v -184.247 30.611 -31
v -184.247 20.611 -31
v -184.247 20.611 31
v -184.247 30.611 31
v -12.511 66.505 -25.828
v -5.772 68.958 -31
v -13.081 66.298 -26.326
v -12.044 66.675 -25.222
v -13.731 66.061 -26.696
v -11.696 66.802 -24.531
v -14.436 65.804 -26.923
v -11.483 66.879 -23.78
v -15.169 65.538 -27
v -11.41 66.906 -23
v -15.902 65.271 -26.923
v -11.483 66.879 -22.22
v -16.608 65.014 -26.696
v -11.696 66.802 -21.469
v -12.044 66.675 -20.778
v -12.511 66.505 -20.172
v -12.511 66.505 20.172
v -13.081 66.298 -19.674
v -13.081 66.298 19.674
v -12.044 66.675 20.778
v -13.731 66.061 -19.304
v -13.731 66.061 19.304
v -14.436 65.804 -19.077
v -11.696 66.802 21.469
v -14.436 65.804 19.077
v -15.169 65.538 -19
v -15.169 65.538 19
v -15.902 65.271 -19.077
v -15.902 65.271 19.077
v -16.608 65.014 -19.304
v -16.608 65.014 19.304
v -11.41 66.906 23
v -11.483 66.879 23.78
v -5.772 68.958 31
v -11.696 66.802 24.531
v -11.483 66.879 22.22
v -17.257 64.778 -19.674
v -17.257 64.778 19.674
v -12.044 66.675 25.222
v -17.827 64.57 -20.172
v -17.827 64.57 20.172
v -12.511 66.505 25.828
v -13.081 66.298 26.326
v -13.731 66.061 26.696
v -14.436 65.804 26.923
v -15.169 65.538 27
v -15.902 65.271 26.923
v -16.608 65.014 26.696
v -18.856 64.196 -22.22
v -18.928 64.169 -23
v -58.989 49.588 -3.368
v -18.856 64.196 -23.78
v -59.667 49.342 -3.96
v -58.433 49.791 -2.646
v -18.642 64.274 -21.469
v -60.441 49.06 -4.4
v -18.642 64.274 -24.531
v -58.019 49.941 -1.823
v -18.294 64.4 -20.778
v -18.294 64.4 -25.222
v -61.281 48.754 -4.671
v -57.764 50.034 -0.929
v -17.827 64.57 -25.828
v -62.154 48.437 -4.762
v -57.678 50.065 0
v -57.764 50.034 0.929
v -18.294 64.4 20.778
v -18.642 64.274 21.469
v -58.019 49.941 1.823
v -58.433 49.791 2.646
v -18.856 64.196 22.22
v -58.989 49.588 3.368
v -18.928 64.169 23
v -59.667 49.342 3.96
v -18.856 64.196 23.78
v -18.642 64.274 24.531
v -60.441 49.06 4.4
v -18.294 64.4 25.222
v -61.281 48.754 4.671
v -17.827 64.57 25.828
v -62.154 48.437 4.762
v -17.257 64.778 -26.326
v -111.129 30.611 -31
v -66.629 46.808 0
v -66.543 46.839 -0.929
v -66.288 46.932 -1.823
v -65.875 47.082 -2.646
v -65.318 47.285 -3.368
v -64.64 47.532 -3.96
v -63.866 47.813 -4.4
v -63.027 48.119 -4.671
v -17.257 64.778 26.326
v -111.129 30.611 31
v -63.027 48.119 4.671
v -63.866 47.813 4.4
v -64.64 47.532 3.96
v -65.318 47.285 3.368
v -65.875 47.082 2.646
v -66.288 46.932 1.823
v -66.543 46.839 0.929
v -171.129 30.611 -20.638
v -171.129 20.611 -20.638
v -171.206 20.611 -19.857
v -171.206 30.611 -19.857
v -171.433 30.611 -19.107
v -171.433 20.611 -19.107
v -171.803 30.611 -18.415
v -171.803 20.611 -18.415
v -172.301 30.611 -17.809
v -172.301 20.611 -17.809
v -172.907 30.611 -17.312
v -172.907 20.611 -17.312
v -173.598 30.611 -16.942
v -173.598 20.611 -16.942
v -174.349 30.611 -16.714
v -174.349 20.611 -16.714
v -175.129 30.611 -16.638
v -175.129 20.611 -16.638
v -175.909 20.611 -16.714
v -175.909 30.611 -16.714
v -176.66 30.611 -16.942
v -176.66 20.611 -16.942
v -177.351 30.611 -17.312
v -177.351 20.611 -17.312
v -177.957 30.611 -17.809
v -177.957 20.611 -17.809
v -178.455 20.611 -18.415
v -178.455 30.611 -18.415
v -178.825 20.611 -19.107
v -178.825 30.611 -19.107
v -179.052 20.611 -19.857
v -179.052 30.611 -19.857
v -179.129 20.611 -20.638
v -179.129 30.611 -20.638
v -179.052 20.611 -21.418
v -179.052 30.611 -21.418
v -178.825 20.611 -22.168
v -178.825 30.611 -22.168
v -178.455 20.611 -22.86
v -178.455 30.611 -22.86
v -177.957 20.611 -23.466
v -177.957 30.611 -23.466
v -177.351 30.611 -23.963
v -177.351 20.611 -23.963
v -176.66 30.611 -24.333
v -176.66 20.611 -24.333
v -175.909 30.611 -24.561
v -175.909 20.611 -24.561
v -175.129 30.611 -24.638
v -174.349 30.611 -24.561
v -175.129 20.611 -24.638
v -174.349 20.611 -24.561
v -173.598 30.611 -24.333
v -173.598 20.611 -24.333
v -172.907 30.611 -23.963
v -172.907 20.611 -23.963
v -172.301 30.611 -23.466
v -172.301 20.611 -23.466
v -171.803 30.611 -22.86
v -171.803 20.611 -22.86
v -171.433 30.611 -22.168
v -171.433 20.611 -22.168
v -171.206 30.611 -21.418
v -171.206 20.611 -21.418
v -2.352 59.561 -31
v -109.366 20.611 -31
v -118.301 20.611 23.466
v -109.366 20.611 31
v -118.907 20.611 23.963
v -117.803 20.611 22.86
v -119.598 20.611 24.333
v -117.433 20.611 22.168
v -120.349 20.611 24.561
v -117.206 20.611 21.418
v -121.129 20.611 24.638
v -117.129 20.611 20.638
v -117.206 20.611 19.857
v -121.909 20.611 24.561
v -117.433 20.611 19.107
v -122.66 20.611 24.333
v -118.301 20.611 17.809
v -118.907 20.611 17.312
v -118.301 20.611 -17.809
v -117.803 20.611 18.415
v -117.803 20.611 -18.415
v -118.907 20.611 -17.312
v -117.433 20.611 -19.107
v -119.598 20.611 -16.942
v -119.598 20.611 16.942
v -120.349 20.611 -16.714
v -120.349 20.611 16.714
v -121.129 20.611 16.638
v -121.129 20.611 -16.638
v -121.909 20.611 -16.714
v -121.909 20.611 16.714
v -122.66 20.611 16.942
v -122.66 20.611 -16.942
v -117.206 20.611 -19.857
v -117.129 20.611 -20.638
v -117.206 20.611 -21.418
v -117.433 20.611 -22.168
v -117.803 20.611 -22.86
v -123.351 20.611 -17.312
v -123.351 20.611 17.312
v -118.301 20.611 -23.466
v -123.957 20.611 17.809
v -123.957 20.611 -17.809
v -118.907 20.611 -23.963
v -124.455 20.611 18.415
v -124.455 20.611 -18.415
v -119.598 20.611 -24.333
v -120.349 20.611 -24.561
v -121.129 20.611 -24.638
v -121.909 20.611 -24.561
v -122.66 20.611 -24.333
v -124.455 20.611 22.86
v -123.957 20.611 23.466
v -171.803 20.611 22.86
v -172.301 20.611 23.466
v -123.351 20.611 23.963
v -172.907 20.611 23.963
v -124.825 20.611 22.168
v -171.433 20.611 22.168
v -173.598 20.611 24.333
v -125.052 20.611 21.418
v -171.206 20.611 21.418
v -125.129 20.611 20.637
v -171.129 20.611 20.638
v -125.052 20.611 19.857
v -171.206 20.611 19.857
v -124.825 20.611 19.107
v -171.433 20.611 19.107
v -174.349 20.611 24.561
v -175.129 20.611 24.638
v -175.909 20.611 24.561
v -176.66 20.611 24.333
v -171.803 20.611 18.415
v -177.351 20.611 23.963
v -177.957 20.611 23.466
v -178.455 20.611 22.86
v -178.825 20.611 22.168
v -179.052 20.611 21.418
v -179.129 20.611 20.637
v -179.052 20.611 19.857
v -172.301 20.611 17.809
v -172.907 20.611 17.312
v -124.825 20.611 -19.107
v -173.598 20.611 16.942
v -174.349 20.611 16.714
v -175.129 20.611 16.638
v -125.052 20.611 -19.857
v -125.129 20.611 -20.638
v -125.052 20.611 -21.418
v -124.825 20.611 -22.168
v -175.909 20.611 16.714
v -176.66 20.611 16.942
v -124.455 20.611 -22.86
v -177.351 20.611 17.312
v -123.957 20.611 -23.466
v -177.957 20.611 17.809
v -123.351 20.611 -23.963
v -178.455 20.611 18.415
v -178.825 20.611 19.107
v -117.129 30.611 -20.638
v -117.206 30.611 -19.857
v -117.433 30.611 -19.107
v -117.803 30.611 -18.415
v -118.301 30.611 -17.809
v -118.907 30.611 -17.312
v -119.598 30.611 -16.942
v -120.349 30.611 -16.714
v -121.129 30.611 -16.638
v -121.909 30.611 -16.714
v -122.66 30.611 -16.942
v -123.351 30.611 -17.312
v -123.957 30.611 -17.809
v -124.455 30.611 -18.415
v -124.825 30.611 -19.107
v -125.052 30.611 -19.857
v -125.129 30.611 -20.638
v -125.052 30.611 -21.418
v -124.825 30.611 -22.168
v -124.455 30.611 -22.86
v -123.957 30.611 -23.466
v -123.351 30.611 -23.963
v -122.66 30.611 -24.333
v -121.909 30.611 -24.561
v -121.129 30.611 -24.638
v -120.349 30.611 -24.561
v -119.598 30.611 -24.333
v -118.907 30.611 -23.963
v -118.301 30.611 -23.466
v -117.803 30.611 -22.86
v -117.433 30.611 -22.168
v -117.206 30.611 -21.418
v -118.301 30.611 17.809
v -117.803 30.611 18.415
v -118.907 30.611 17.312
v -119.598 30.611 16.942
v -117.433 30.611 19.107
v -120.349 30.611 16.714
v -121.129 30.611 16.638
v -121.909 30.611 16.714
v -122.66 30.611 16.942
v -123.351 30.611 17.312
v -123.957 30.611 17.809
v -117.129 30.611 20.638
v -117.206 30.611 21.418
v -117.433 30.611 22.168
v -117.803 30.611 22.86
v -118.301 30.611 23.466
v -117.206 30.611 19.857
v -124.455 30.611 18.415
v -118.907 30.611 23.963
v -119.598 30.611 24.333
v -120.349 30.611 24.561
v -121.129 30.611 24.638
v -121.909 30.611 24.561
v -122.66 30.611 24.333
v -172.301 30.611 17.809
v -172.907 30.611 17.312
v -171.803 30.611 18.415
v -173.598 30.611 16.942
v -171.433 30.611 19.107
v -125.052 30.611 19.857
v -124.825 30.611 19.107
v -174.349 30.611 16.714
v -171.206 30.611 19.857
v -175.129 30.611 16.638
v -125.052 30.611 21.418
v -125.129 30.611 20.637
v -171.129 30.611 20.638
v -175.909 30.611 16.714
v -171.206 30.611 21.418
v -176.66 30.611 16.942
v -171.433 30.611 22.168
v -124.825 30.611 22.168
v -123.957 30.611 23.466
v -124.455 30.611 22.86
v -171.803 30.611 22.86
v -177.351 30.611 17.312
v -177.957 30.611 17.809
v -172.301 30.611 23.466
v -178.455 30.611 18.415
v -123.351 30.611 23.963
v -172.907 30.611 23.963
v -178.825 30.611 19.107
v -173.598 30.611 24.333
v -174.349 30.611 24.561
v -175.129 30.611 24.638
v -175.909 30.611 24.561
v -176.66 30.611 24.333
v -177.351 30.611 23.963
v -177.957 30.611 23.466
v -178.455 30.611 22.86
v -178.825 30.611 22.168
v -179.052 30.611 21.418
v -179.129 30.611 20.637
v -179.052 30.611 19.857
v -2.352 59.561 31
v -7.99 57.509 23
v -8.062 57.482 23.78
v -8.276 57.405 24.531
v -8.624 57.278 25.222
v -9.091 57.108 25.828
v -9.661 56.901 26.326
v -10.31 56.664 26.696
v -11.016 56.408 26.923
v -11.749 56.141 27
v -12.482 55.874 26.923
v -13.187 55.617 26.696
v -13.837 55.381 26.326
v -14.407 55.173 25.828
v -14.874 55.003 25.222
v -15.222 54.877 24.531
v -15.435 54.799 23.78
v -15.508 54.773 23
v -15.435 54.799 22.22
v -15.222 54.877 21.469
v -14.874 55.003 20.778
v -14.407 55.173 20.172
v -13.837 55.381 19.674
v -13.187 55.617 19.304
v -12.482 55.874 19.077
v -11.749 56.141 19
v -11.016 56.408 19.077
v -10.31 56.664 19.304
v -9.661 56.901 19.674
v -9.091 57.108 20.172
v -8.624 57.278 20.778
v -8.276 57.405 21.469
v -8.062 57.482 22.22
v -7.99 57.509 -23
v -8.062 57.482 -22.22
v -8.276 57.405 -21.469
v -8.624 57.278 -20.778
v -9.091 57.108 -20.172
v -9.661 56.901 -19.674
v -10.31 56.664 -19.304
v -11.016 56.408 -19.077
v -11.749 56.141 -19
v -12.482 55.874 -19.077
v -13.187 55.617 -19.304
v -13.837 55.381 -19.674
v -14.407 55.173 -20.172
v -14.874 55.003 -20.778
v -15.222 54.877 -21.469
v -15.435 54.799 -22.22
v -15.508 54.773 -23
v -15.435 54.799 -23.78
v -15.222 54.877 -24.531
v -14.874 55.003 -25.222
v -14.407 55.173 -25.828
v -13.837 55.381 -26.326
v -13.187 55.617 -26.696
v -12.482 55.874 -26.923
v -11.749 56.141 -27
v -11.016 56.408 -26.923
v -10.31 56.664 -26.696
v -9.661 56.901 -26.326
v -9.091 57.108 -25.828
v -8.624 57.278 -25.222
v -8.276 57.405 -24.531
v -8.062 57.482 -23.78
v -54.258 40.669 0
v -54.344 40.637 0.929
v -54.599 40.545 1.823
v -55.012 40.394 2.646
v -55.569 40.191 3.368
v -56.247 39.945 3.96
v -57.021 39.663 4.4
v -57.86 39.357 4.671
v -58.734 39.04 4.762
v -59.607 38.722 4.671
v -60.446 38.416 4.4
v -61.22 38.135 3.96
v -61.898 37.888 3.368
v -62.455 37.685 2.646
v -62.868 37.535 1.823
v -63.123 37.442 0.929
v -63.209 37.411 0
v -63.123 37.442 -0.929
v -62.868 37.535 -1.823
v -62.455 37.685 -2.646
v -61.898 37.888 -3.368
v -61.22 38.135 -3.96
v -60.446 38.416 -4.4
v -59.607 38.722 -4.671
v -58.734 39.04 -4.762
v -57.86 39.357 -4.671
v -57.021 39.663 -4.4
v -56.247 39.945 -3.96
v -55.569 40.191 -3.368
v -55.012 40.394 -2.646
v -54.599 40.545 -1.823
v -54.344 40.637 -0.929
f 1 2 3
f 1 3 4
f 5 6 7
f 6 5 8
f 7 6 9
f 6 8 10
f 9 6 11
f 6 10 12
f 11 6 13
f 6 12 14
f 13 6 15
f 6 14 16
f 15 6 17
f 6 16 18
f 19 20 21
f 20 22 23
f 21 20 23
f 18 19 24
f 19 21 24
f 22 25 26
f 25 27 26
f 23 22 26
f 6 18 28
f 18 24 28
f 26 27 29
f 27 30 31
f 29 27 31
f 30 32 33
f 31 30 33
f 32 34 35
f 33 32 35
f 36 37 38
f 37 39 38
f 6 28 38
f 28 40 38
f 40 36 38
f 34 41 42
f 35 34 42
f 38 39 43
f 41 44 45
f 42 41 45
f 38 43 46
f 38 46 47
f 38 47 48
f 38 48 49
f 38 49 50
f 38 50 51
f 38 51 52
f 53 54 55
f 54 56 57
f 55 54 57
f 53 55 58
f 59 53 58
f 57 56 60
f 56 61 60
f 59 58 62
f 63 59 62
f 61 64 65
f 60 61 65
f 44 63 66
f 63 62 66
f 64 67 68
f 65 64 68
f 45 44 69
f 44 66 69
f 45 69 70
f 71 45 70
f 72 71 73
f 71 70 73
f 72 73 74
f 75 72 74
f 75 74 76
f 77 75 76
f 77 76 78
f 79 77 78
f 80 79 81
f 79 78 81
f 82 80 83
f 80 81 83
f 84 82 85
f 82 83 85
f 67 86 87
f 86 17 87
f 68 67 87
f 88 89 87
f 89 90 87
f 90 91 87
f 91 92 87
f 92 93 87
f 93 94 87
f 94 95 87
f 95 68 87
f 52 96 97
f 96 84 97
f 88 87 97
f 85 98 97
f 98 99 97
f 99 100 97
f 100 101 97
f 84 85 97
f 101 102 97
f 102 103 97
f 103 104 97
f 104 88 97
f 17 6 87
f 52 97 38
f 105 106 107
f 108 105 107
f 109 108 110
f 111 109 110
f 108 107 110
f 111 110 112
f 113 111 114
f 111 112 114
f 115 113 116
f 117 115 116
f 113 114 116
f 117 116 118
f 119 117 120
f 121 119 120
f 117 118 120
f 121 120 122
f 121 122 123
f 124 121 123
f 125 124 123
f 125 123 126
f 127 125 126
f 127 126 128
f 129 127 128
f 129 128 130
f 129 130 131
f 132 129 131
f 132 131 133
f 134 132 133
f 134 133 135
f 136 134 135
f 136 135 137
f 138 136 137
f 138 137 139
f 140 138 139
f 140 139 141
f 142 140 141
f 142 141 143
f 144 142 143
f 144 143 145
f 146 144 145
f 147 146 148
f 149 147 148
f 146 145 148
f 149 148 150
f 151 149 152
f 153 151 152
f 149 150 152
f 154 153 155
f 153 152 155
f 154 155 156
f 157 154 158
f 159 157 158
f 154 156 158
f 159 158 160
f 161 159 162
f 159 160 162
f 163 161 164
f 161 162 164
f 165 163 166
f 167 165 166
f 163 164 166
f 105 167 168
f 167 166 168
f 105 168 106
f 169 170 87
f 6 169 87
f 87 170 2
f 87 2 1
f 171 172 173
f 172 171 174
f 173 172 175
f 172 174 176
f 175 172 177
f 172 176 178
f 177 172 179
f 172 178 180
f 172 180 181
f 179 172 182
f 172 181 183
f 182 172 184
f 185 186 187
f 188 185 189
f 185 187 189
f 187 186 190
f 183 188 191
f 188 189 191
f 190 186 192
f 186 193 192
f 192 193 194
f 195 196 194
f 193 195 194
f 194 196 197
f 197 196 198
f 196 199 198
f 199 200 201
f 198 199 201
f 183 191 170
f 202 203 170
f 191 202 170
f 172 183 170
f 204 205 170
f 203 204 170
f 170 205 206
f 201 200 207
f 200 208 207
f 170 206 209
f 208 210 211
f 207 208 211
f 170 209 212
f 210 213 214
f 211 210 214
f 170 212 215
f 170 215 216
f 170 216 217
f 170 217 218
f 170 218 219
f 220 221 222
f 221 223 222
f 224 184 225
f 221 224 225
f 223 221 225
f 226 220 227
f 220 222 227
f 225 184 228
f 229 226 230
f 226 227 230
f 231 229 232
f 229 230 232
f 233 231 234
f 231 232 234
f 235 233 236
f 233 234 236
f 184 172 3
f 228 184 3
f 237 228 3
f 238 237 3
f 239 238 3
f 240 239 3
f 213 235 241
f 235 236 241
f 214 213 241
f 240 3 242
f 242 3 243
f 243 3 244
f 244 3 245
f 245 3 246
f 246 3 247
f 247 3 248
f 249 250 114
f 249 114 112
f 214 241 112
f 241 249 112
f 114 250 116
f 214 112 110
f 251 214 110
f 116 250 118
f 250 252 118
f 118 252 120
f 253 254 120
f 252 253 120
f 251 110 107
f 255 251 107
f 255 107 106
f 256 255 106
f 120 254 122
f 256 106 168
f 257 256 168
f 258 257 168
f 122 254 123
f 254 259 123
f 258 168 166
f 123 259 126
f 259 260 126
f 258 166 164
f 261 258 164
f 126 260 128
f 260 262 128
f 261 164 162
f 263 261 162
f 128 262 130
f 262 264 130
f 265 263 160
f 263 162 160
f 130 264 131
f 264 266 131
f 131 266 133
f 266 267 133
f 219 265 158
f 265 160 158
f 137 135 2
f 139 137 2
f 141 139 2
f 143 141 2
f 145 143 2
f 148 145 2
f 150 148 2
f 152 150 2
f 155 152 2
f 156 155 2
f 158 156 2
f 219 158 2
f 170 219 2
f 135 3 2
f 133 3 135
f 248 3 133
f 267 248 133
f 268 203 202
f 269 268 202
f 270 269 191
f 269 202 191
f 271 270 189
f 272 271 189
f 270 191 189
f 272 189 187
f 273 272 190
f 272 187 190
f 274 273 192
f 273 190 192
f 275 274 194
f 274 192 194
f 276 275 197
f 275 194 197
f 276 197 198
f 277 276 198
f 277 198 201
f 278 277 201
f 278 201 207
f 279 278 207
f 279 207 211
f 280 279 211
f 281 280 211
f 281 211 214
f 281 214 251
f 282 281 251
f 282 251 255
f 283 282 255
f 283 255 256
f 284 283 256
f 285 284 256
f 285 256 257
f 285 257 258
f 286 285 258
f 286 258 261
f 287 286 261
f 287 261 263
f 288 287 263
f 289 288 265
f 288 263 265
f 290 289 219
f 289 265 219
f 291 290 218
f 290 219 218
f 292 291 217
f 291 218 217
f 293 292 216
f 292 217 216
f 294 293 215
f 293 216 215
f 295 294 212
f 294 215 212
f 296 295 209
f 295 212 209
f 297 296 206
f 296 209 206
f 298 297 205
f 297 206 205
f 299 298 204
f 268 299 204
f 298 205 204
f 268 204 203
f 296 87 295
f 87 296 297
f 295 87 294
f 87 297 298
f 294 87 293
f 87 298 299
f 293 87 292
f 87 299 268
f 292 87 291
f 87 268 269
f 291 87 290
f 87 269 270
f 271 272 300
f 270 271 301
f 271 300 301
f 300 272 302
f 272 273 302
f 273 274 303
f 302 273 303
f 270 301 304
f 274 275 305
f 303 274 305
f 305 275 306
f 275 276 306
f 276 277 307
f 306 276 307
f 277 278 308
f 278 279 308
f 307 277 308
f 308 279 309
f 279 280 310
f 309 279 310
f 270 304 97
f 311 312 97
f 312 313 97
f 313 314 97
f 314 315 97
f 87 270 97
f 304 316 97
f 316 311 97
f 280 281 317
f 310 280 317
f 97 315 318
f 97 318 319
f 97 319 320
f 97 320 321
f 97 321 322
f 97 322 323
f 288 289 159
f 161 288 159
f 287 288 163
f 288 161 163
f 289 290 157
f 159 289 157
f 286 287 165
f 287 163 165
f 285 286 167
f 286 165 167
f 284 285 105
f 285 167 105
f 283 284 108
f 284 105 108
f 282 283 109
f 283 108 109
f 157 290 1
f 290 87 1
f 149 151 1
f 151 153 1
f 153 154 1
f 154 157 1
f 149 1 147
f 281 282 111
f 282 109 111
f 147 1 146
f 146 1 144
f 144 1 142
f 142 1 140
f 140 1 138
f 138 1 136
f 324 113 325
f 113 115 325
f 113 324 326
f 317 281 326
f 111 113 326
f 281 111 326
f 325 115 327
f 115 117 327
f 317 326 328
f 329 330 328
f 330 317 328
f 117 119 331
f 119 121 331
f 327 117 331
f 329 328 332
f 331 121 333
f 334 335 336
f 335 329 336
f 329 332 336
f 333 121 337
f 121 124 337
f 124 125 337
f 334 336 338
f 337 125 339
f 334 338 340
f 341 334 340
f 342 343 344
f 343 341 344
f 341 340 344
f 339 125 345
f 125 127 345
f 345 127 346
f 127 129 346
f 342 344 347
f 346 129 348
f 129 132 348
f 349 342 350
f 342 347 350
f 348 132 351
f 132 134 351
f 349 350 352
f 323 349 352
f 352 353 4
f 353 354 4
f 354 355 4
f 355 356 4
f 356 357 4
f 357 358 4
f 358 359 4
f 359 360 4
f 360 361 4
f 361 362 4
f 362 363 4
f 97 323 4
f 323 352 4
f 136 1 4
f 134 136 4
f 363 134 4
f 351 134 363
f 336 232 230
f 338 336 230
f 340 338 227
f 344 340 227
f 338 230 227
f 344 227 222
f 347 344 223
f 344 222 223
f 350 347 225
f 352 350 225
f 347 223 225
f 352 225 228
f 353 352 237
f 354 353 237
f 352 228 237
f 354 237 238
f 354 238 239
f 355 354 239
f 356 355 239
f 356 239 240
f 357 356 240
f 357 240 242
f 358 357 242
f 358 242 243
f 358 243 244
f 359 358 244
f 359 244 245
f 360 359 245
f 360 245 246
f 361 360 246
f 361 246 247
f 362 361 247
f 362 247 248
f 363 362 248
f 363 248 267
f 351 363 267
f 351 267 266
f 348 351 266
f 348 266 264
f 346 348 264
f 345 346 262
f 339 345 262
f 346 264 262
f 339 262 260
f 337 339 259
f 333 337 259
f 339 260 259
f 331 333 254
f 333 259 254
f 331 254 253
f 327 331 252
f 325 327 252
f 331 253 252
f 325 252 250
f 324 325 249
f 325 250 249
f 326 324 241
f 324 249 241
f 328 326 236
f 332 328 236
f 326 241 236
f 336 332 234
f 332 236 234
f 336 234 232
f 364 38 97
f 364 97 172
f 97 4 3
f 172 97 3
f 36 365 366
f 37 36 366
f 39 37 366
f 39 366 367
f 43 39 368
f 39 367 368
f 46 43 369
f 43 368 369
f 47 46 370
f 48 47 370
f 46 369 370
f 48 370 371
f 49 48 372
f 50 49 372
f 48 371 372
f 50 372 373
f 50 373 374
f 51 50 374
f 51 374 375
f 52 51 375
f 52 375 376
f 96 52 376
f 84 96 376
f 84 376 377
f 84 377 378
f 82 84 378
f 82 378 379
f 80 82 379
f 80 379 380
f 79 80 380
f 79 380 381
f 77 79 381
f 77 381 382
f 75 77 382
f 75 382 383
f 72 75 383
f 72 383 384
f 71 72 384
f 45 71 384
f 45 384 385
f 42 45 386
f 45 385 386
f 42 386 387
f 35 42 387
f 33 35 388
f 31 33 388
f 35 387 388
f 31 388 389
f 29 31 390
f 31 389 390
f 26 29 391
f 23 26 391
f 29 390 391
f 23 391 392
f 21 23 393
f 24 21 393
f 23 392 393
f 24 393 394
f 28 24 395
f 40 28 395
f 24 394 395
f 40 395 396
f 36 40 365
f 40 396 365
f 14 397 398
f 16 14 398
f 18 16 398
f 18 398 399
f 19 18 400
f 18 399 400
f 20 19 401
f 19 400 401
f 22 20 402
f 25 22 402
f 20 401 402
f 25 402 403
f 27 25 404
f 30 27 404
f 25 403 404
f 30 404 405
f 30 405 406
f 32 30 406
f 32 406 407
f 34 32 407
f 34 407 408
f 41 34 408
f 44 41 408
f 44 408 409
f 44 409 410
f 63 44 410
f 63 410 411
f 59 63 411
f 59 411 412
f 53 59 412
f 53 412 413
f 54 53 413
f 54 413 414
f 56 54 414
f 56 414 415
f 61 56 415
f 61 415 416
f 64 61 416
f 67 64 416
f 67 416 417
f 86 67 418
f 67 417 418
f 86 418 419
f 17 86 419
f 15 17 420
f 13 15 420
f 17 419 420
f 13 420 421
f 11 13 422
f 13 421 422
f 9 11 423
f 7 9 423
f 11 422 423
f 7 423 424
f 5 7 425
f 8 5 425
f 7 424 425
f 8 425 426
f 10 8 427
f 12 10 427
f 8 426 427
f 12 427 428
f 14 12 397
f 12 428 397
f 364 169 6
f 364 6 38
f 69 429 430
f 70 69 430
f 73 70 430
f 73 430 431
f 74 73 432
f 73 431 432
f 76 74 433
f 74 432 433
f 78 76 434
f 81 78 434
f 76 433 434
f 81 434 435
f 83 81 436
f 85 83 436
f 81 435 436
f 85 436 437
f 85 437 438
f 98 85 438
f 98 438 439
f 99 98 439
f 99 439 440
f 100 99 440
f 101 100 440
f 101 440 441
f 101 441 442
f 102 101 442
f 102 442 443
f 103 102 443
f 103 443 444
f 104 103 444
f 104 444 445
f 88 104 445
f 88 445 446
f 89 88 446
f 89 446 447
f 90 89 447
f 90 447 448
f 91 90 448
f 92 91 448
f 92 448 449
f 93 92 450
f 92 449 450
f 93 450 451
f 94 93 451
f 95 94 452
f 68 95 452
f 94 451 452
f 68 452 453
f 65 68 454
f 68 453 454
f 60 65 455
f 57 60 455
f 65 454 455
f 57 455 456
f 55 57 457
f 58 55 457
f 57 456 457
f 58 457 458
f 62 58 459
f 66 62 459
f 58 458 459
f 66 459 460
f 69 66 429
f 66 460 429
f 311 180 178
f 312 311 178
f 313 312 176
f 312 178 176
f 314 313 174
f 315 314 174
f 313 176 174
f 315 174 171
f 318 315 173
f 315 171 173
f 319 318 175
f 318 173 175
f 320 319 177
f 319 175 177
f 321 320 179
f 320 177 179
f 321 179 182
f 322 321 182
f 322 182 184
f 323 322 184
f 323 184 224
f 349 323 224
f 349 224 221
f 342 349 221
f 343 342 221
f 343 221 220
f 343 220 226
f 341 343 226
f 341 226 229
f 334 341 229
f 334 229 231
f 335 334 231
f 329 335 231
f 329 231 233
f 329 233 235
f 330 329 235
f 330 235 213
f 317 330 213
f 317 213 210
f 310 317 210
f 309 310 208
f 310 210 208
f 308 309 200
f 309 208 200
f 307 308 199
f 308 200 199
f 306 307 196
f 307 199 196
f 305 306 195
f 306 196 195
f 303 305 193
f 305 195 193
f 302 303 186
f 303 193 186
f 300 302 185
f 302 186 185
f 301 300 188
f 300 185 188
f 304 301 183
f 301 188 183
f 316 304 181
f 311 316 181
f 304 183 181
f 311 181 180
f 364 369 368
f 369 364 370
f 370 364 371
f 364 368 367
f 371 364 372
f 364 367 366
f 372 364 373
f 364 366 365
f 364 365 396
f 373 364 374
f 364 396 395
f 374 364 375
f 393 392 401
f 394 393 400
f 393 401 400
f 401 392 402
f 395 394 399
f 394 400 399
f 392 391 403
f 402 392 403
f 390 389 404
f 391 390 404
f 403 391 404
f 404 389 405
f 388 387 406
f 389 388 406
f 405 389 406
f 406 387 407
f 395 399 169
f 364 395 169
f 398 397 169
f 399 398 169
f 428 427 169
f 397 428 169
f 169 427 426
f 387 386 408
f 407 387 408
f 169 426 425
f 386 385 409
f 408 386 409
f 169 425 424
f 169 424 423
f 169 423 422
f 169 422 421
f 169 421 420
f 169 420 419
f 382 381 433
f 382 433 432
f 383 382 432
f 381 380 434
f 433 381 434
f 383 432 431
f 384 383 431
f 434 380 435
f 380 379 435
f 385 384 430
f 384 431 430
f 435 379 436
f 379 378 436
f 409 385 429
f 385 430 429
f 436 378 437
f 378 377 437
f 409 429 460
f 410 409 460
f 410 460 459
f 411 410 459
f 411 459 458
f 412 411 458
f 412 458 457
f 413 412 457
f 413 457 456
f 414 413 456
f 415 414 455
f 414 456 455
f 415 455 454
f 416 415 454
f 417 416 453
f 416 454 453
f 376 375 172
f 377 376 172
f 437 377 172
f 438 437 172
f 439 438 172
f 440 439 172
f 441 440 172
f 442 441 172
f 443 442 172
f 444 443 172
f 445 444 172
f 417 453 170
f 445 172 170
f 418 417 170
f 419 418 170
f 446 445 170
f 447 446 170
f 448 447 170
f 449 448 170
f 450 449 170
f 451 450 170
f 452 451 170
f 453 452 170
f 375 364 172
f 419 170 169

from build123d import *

# Parameters (mm, degrees)
F1_W     = 10
F1_H     = 62
F4_D     = 8
F5_D     = 9.525
F7_D     = 8
F8_ANGLE = -20


# Not quite as in the source:
# - a length typed as a fraction of an inch, garbled in the dataset ("3 / 203.2 mm" for 3/8 in), is restored


with BuildPart() as f2:
    # F2: sweep along a path in F0
    with BuildLine(Plane.XY) as f2_path:
        Line((0, 0), (-113, 0))
        Line((-113, 0), (-182.5372539382, 25.3094906061))
    # F1 (on Right) → F2 (sweep)
    with BuildSketch(Plane.YZ):
        Rectangle(F1_W, F1_H)
    sweep(path=f2_path.line, transition=Transition.RIGHT)

    # F4 (through all)
    with Locations(Plane(origin=(0, 5, 0), x_dir=(-1, 0, 0), z_dir=(0, 1, 0))):
        with Locations((10, -23), (10, 23)):
            Hole(F4_D / 2)

    # F5 (through all)
    with Locations(Plane(origin=(0, 5, 0), x_dir=(-1, 0, 0), z_dir=(0, 1, 0))):
        with Locations((60, 0)):
            Hole(F5_D / 2)

    # F7 (through all)
    with Locations(Plane(origin=(-11.5083882471, -31.6190368434, 0), x_dir=(-0.9396926208, 0.3420201433, 0), z_dir=(0.3420201433, 0.9396926208, 0))):
        with Locations((117.0669010524, 20.6375), (171.0669010524, 20.6375), (171.0669010524, -20.6375), (117.0669010524, -20.6375)):
            Hole(F7_D / 2)


with BuildPart() as f2_1:
    # F8: moved
    add(f2.part.rotate(Axis((-184.2473546548, 20.6110275022, 0), (0, 0, -1)), F8_ANGLE))


solid = f2_1.part
